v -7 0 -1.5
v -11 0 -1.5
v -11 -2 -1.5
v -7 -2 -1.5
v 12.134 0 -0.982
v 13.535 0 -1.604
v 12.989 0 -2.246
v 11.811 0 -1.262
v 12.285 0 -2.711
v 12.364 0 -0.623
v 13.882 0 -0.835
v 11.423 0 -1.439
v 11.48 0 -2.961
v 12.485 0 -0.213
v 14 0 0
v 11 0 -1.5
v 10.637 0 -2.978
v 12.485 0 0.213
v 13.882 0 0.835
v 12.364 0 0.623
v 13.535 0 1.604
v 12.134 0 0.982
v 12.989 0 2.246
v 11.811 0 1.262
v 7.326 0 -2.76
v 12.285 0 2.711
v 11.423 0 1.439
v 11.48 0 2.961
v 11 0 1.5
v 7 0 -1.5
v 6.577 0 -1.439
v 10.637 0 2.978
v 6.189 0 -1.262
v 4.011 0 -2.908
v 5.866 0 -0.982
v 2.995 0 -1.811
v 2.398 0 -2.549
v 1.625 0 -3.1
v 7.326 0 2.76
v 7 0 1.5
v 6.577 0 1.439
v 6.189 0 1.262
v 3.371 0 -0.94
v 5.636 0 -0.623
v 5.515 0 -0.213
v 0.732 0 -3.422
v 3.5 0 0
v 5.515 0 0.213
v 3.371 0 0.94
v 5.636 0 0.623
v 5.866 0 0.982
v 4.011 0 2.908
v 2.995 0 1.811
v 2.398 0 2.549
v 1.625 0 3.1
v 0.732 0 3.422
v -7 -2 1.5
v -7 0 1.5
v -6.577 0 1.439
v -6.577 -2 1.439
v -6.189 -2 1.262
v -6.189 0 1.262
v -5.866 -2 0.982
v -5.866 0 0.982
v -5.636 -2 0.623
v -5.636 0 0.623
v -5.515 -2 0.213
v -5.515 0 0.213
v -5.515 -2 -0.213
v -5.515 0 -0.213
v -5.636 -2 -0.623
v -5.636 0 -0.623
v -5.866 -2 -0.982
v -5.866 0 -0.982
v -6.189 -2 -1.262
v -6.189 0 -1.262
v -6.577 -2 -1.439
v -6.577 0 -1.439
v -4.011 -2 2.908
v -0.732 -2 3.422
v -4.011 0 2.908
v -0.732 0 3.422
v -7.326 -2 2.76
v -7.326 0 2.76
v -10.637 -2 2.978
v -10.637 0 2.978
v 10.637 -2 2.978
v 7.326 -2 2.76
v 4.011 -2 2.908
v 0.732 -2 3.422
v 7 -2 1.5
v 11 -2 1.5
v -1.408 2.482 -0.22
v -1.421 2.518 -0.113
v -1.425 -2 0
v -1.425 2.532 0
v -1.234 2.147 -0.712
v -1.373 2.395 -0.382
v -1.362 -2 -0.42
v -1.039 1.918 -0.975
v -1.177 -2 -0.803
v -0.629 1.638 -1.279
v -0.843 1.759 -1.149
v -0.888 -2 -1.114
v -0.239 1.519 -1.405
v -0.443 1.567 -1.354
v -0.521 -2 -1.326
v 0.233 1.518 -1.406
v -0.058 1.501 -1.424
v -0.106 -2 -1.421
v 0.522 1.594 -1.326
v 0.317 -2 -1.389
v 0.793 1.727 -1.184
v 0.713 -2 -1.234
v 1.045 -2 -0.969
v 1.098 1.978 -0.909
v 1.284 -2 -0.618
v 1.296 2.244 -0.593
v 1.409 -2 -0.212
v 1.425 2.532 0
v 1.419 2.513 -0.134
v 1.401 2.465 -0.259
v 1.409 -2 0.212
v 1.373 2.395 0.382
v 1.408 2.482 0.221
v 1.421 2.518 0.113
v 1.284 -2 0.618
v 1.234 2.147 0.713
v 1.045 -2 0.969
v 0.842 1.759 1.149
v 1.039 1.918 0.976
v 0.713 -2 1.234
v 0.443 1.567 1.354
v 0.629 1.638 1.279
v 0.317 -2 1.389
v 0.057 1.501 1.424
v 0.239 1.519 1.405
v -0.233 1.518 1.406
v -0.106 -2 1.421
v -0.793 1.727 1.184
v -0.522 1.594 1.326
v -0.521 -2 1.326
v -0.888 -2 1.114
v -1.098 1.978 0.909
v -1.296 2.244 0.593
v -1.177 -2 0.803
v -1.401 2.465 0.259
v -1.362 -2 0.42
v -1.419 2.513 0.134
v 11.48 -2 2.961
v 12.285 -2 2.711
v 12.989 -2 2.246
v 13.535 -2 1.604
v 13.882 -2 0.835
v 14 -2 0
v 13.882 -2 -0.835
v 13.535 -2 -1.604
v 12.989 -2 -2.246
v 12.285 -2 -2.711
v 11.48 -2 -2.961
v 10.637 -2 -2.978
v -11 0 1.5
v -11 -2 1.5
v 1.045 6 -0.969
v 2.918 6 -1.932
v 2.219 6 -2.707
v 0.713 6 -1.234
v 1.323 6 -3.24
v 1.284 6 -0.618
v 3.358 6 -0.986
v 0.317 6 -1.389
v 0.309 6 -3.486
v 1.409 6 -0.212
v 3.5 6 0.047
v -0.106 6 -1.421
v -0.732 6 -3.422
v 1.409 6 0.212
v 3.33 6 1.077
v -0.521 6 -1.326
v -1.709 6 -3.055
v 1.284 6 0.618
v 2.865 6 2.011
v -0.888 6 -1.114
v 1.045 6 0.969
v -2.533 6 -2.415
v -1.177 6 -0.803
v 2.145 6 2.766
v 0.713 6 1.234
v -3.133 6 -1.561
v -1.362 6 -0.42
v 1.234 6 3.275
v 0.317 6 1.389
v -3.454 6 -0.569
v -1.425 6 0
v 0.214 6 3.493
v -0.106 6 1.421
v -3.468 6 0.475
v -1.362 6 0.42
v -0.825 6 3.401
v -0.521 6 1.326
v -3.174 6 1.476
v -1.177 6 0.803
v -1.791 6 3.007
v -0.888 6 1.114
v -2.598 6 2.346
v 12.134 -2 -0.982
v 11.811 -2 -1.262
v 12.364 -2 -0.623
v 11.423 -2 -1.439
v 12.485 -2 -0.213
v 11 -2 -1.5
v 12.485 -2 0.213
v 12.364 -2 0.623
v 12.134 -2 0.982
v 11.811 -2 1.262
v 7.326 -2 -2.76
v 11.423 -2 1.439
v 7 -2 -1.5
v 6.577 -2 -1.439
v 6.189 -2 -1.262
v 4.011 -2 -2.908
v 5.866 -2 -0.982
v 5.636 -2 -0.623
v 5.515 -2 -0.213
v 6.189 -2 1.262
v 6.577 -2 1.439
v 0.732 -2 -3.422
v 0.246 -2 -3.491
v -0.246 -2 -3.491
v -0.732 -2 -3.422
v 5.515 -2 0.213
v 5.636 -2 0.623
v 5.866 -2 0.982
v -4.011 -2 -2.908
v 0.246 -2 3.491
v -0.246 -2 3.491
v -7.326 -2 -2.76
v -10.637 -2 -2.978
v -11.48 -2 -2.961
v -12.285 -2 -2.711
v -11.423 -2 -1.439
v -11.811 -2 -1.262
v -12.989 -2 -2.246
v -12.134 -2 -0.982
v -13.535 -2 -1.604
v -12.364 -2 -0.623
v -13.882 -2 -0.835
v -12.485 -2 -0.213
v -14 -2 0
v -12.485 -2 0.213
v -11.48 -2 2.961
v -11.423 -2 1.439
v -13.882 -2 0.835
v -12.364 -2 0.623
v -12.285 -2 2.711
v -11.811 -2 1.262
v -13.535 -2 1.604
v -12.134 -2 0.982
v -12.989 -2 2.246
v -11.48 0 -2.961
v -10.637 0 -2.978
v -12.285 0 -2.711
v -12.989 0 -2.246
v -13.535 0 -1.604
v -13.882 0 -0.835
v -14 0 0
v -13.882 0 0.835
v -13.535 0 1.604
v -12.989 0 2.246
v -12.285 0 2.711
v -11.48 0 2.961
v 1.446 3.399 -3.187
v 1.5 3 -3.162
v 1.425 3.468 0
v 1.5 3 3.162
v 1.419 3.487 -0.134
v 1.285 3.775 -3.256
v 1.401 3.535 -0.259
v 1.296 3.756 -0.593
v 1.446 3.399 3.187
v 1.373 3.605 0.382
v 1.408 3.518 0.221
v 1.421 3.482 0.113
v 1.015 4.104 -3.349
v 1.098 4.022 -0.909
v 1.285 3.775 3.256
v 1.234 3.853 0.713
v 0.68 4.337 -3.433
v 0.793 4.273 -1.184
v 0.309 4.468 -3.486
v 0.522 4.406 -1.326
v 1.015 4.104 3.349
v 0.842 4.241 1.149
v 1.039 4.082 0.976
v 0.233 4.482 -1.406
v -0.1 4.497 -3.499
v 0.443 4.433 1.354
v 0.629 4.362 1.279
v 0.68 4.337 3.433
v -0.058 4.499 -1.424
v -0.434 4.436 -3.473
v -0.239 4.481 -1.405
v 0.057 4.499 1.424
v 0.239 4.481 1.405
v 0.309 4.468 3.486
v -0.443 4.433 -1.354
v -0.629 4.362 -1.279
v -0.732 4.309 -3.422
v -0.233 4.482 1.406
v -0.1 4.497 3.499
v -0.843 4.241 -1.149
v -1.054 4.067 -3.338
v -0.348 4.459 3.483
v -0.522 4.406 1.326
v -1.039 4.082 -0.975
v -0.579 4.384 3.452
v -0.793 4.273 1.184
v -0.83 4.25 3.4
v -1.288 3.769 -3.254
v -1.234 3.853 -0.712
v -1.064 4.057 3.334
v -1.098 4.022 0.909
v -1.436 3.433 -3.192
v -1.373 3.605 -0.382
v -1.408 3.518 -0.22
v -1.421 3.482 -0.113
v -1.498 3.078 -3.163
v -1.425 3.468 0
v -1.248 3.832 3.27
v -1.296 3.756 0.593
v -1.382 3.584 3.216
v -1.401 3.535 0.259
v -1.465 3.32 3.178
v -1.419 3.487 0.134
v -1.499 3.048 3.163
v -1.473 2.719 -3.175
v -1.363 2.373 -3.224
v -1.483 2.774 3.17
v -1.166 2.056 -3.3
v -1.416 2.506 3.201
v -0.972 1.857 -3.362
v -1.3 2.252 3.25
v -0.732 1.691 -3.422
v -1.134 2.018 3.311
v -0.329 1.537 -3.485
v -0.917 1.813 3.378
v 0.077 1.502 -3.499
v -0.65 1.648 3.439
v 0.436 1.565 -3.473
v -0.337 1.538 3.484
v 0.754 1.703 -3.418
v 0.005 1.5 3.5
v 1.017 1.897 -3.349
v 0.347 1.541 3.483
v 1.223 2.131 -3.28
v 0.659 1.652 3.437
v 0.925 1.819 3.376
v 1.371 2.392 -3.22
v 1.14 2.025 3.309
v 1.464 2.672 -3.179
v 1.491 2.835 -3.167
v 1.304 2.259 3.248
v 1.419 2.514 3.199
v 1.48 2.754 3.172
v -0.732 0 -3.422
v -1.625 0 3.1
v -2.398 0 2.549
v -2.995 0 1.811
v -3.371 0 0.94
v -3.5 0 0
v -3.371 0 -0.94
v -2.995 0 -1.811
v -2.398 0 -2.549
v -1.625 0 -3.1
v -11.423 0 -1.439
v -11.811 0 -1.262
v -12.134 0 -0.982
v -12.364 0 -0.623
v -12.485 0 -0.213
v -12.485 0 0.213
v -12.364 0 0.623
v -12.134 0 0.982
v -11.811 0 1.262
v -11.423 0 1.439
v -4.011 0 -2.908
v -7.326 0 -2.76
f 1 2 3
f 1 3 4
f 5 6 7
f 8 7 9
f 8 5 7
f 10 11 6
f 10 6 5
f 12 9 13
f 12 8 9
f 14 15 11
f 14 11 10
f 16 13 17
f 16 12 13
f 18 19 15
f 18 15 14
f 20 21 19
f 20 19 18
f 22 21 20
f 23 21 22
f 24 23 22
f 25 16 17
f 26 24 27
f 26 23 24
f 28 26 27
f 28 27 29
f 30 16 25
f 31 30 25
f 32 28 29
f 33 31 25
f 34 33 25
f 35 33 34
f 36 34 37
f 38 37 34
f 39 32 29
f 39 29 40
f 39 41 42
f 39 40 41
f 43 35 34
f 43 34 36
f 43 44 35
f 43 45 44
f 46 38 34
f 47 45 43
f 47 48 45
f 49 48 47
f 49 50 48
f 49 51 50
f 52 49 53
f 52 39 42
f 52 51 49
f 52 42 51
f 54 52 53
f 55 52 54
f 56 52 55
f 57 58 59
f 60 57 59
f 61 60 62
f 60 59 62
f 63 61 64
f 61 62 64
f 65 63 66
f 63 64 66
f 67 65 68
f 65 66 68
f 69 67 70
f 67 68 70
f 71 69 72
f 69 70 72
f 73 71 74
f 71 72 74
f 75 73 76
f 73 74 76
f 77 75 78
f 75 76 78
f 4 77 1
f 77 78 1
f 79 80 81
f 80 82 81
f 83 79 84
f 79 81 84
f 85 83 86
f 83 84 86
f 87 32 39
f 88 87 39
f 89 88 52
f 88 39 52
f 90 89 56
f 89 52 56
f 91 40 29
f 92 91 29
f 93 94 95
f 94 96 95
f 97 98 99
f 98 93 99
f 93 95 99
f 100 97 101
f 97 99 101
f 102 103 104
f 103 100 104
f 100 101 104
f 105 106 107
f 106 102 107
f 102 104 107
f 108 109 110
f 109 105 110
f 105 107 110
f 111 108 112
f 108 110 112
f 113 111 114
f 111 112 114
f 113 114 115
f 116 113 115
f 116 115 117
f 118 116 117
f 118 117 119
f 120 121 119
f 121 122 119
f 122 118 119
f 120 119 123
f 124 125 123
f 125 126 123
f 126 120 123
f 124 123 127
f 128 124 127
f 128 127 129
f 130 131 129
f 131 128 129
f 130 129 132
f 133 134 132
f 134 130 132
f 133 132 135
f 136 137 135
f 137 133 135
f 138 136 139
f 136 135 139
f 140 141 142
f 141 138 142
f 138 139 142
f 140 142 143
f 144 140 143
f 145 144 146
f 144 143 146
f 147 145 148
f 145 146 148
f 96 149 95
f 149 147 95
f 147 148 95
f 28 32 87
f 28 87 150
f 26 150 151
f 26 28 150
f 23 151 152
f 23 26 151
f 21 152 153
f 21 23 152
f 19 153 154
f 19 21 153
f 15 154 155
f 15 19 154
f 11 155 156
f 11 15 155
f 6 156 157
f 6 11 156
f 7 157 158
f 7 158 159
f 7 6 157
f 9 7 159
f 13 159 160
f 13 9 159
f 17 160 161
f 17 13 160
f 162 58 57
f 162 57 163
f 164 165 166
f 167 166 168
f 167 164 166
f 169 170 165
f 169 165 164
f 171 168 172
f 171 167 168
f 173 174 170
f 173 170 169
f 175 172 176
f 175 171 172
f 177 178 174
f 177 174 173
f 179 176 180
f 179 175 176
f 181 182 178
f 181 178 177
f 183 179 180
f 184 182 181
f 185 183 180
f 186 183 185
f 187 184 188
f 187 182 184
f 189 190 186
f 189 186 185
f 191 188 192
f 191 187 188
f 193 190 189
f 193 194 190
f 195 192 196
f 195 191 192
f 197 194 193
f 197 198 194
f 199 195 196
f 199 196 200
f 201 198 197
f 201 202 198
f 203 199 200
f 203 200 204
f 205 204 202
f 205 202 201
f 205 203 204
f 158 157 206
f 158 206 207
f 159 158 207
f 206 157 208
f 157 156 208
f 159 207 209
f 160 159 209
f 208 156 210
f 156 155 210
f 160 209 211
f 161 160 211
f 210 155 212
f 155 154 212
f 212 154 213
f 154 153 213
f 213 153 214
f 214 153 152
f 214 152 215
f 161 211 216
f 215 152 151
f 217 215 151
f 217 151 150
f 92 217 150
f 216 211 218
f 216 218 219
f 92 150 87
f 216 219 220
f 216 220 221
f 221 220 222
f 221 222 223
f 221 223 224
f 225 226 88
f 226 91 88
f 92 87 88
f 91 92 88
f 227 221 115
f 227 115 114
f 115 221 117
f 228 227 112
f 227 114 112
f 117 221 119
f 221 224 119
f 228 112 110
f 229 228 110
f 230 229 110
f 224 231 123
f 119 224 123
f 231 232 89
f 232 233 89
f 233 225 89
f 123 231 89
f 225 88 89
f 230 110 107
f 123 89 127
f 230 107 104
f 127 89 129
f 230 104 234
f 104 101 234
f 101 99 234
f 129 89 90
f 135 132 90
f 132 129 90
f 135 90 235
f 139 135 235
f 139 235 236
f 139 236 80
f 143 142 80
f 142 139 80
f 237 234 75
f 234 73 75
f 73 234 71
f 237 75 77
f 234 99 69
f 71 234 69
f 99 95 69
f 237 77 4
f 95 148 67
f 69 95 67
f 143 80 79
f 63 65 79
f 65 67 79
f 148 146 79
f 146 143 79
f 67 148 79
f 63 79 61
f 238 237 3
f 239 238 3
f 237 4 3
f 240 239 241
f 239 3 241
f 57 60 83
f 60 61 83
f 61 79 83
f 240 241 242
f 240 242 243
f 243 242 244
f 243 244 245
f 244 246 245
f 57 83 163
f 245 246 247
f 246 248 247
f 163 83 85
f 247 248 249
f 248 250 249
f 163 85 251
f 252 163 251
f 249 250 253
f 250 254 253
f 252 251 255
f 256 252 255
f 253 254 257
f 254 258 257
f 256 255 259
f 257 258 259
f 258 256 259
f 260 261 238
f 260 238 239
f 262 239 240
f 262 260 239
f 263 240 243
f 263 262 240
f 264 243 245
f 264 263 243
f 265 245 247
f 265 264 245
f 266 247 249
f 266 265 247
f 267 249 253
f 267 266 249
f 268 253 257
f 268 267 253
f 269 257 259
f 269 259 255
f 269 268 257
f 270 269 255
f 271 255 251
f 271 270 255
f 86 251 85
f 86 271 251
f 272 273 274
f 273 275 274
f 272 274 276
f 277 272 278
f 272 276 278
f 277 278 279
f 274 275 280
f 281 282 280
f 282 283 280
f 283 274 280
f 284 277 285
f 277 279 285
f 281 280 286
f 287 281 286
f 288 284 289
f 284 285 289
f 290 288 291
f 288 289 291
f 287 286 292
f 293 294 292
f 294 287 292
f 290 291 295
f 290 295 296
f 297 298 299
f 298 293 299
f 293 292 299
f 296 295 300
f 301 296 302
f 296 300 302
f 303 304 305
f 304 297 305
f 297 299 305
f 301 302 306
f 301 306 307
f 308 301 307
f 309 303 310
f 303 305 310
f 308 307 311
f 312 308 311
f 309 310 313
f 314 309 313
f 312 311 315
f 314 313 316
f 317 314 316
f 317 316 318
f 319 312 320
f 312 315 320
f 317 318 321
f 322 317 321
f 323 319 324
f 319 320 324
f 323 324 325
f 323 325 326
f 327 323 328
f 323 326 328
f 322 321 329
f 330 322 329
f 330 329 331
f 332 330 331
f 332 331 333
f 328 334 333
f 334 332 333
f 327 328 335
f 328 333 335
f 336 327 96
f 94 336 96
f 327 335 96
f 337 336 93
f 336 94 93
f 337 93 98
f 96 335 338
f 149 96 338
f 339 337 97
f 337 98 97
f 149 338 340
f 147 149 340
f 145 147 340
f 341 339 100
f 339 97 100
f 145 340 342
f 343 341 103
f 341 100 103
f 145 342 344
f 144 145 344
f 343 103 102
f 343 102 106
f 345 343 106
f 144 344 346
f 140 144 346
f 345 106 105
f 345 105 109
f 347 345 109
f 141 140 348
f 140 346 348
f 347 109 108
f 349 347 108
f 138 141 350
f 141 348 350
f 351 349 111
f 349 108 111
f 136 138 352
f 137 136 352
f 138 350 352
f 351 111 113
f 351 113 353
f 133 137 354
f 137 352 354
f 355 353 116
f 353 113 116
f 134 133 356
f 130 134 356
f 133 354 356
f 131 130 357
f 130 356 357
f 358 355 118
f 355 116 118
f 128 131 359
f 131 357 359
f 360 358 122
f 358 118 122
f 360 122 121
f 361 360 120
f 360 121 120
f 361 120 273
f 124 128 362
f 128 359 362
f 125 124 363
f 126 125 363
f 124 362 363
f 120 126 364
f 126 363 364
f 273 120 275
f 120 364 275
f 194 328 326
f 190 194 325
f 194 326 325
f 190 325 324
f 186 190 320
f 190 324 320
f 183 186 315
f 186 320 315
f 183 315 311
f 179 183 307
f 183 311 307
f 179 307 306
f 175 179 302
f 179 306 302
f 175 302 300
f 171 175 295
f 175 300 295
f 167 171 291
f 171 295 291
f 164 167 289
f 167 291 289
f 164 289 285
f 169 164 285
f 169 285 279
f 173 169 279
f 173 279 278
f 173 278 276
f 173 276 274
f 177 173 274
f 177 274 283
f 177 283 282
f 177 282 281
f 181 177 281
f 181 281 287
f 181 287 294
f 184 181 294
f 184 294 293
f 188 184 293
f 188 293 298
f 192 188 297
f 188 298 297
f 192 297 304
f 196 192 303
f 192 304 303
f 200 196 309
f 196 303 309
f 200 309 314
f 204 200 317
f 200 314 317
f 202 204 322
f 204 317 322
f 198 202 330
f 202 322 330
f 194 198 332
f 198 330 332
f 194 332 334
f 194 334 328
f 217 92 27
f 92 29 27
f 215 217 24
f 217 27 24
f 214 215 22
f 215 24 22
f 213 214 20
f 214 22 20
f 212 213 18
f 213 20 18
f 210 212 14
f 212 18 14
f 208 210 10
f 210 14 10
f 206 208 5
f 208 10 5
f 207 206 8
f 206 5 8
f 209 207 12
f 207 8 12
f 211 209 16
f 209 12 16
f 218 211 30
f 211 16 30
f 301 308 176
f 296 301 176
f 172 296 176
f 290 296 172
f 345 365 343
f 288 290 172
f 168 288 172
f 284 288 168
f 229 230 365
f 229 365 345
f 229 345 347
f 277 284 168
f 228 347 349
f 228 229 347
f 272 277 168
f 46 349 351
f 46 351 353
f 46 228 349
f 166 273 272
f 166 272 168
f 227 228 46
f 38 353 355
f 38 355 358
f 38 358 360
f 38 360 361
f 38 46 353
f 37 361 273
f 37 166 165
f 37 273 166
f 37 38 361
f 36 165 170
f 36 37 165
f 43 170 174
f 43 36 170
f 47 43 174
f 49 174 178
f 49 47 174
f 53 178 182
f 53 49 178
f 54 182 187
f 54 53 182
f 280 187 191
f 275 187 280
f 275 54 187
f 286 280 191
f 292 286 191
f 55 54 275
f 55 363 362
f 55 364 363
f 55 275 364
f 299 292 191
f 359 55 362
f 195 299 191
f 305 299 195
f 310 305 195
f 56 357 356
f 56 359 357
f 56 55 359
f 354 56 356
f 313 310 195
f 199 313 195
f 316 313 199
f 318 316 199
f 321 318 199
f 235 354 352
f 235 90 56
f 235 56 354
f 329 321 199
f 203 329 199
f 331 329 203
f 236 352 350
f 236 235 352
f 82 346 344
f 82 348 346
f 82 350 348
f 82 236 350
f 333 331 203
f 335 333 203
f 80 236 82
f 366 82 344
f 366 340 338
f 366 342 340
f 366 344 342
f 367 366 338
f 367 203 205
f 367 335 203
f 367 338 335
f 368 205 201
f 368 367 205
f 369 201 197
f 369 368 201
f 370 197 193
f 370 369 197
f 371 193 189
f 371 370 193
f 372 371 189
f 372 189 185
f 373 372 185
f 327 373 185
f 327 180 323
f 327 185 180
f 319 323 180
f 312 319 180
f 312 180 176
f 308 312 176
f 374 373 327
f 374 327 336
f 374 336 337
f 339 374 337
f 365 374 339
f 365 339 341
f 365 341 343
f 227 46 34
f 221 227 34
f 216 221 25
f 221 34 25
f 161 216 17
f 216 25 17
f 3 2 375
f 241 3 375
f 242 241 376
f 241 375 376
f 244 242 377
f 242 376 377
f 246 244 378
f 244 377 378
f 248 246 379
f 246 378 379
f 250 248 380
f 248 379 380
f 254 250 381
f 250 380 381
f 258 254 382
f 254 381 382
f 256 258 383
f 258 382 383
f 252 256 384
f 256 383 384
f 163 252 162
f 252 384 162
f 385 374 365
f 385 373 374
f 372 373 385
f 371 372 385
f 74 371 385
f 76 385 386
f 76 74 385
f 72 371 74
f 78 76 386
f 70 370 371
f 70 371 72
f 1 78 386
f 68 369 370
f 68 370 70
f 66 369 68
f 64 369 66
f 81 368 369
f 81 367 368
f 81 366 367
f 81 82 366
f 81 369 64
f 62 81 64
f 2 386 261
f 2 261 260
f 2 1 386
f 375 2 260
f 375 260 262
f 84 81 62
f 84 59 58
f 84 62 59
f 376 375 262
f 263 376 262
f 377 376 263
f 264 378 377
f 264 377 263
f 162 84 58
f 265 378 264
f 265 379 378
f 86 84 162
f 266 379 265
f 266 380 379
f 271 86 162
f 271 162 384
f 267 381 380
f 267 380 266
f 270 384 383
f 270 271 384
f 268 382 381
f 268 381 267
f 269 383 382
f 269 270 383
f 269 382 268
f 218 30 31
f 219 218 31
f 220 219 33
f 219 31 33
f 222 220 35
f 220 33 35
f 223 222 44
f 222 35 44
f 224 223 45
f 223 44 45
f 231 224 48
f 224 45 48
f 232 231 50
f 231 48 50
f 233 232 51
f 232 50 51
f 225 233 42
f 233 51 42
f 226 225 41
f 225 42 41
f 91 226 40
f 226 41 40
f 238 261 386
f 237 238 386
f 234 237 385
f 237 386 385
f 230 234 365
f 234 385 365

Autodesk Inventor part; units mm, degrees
ref_plane "YZ Plane" through (0, 0, 0) normal (1, 0, 0) x (0, 1, 0)
ref_plane "XZ Plane" through (0, 0, 0) normal (0, 1, 0) x (-1, 0, 0)
sketch "Sketch1" plane through (0, 0, 0) normal (0, 1, 0) x (-1, 0, 0)
  circle A0 centre (0, 0) radius 1.425
  arc A1 (0.7325, 3.4225) -> (0.7325, -3.4225) centre (0, 0) ccw
  arc A2 (-10.6374, 2.978) -> (-10.6374, -2.978) centre (-11, 0) ccw
  arc A3 (-0.7325, -3.4225) -> (-10.6374, -2.978) centre (-7.0114, -32.7581) ccw
  arc A4 (-10.6374, 2.978) -> (-0.7325, 3.4225) centre (-7.0114, 32.7581) ccw
  line L0 (0, 0) -> (0, -3.5) construction
  arc A5 (10.6374, -2.978) -> (10.6374, 2.978) centre (11, 0) ccw
  arc A6 (10.6374, -2.978) -> (0.7325, -3.4225) centre (7.0114, -32.7581) ccw
  arc A7 (0.7325, 3.4225) -> (10.6374, 2.978) centre (7.0114, 32.7581) ccw
  arc A8 (0.7325, -3.4225) -> (0.7325, 3.4225) centre (0, 0) ccw
  line L1 (-7, 0) -> (-11, 0) construction
  line L2 (-7, 1.5) -> (-11, 1.5)
  line L3 (-11, -1.5) -> (-7, -1.5)
  arc A9 (-7, -1.5) -> (-7, 1.5) centre (-7, 0) ccw
  arc A10 (-11, 1.5) -> (-11, -1.5) centre (-11, 0) ccw
  line L4 (0, 0) -> (0, 10.6899) construction
  line L5 (7, 1.5) -> (11, 1.5)
  line L6 (11, -1.5) -> (7, -1.5)
  arc A11 (7, 1.5) -> (7, -1.5) centre (7, 0) ccw
  arc A12 (11, -1.5) -> (11, 1.5) centre (11, 0) ccw
  point P0 (-9, 0)
  dimension "d0" = 2.85
  dimension "d1" = 7
  dimension "d6" = 3
  dimension "d14" = 30
  dimension "d15" = 3
  dimension "d16" = 4
  dimension "d17" = 7
extrude "Extrusion1" add sketch "Sketch1" against normal blind 2
extrude "Extrusion2" add sketch "Sketch1" along normal blind 6 contours A8 A1
sketch "Sketch2" plane through (0, 0, 0) normal (0, 0, 1) x (1, 0, 0)
  circle A0 centre (0, 3) radius 1.5
  line L0 (3.5, 6) -> (3.5, 0) projected
  point P0 (0, 0)
  point P1 (3.5, 3)
  dimension "d11" = 3
extrude "Extrusion3" cut sketch "Sketch2" along normal through all both and the other way through all
ref_plane "Work Plane1" through (0, 0, 3.5) normal (0, 0, 1) x (1, 0, 0)
properties part number "EncoderWheelAdapterSmallSlotted" material "ABS Plastic"
